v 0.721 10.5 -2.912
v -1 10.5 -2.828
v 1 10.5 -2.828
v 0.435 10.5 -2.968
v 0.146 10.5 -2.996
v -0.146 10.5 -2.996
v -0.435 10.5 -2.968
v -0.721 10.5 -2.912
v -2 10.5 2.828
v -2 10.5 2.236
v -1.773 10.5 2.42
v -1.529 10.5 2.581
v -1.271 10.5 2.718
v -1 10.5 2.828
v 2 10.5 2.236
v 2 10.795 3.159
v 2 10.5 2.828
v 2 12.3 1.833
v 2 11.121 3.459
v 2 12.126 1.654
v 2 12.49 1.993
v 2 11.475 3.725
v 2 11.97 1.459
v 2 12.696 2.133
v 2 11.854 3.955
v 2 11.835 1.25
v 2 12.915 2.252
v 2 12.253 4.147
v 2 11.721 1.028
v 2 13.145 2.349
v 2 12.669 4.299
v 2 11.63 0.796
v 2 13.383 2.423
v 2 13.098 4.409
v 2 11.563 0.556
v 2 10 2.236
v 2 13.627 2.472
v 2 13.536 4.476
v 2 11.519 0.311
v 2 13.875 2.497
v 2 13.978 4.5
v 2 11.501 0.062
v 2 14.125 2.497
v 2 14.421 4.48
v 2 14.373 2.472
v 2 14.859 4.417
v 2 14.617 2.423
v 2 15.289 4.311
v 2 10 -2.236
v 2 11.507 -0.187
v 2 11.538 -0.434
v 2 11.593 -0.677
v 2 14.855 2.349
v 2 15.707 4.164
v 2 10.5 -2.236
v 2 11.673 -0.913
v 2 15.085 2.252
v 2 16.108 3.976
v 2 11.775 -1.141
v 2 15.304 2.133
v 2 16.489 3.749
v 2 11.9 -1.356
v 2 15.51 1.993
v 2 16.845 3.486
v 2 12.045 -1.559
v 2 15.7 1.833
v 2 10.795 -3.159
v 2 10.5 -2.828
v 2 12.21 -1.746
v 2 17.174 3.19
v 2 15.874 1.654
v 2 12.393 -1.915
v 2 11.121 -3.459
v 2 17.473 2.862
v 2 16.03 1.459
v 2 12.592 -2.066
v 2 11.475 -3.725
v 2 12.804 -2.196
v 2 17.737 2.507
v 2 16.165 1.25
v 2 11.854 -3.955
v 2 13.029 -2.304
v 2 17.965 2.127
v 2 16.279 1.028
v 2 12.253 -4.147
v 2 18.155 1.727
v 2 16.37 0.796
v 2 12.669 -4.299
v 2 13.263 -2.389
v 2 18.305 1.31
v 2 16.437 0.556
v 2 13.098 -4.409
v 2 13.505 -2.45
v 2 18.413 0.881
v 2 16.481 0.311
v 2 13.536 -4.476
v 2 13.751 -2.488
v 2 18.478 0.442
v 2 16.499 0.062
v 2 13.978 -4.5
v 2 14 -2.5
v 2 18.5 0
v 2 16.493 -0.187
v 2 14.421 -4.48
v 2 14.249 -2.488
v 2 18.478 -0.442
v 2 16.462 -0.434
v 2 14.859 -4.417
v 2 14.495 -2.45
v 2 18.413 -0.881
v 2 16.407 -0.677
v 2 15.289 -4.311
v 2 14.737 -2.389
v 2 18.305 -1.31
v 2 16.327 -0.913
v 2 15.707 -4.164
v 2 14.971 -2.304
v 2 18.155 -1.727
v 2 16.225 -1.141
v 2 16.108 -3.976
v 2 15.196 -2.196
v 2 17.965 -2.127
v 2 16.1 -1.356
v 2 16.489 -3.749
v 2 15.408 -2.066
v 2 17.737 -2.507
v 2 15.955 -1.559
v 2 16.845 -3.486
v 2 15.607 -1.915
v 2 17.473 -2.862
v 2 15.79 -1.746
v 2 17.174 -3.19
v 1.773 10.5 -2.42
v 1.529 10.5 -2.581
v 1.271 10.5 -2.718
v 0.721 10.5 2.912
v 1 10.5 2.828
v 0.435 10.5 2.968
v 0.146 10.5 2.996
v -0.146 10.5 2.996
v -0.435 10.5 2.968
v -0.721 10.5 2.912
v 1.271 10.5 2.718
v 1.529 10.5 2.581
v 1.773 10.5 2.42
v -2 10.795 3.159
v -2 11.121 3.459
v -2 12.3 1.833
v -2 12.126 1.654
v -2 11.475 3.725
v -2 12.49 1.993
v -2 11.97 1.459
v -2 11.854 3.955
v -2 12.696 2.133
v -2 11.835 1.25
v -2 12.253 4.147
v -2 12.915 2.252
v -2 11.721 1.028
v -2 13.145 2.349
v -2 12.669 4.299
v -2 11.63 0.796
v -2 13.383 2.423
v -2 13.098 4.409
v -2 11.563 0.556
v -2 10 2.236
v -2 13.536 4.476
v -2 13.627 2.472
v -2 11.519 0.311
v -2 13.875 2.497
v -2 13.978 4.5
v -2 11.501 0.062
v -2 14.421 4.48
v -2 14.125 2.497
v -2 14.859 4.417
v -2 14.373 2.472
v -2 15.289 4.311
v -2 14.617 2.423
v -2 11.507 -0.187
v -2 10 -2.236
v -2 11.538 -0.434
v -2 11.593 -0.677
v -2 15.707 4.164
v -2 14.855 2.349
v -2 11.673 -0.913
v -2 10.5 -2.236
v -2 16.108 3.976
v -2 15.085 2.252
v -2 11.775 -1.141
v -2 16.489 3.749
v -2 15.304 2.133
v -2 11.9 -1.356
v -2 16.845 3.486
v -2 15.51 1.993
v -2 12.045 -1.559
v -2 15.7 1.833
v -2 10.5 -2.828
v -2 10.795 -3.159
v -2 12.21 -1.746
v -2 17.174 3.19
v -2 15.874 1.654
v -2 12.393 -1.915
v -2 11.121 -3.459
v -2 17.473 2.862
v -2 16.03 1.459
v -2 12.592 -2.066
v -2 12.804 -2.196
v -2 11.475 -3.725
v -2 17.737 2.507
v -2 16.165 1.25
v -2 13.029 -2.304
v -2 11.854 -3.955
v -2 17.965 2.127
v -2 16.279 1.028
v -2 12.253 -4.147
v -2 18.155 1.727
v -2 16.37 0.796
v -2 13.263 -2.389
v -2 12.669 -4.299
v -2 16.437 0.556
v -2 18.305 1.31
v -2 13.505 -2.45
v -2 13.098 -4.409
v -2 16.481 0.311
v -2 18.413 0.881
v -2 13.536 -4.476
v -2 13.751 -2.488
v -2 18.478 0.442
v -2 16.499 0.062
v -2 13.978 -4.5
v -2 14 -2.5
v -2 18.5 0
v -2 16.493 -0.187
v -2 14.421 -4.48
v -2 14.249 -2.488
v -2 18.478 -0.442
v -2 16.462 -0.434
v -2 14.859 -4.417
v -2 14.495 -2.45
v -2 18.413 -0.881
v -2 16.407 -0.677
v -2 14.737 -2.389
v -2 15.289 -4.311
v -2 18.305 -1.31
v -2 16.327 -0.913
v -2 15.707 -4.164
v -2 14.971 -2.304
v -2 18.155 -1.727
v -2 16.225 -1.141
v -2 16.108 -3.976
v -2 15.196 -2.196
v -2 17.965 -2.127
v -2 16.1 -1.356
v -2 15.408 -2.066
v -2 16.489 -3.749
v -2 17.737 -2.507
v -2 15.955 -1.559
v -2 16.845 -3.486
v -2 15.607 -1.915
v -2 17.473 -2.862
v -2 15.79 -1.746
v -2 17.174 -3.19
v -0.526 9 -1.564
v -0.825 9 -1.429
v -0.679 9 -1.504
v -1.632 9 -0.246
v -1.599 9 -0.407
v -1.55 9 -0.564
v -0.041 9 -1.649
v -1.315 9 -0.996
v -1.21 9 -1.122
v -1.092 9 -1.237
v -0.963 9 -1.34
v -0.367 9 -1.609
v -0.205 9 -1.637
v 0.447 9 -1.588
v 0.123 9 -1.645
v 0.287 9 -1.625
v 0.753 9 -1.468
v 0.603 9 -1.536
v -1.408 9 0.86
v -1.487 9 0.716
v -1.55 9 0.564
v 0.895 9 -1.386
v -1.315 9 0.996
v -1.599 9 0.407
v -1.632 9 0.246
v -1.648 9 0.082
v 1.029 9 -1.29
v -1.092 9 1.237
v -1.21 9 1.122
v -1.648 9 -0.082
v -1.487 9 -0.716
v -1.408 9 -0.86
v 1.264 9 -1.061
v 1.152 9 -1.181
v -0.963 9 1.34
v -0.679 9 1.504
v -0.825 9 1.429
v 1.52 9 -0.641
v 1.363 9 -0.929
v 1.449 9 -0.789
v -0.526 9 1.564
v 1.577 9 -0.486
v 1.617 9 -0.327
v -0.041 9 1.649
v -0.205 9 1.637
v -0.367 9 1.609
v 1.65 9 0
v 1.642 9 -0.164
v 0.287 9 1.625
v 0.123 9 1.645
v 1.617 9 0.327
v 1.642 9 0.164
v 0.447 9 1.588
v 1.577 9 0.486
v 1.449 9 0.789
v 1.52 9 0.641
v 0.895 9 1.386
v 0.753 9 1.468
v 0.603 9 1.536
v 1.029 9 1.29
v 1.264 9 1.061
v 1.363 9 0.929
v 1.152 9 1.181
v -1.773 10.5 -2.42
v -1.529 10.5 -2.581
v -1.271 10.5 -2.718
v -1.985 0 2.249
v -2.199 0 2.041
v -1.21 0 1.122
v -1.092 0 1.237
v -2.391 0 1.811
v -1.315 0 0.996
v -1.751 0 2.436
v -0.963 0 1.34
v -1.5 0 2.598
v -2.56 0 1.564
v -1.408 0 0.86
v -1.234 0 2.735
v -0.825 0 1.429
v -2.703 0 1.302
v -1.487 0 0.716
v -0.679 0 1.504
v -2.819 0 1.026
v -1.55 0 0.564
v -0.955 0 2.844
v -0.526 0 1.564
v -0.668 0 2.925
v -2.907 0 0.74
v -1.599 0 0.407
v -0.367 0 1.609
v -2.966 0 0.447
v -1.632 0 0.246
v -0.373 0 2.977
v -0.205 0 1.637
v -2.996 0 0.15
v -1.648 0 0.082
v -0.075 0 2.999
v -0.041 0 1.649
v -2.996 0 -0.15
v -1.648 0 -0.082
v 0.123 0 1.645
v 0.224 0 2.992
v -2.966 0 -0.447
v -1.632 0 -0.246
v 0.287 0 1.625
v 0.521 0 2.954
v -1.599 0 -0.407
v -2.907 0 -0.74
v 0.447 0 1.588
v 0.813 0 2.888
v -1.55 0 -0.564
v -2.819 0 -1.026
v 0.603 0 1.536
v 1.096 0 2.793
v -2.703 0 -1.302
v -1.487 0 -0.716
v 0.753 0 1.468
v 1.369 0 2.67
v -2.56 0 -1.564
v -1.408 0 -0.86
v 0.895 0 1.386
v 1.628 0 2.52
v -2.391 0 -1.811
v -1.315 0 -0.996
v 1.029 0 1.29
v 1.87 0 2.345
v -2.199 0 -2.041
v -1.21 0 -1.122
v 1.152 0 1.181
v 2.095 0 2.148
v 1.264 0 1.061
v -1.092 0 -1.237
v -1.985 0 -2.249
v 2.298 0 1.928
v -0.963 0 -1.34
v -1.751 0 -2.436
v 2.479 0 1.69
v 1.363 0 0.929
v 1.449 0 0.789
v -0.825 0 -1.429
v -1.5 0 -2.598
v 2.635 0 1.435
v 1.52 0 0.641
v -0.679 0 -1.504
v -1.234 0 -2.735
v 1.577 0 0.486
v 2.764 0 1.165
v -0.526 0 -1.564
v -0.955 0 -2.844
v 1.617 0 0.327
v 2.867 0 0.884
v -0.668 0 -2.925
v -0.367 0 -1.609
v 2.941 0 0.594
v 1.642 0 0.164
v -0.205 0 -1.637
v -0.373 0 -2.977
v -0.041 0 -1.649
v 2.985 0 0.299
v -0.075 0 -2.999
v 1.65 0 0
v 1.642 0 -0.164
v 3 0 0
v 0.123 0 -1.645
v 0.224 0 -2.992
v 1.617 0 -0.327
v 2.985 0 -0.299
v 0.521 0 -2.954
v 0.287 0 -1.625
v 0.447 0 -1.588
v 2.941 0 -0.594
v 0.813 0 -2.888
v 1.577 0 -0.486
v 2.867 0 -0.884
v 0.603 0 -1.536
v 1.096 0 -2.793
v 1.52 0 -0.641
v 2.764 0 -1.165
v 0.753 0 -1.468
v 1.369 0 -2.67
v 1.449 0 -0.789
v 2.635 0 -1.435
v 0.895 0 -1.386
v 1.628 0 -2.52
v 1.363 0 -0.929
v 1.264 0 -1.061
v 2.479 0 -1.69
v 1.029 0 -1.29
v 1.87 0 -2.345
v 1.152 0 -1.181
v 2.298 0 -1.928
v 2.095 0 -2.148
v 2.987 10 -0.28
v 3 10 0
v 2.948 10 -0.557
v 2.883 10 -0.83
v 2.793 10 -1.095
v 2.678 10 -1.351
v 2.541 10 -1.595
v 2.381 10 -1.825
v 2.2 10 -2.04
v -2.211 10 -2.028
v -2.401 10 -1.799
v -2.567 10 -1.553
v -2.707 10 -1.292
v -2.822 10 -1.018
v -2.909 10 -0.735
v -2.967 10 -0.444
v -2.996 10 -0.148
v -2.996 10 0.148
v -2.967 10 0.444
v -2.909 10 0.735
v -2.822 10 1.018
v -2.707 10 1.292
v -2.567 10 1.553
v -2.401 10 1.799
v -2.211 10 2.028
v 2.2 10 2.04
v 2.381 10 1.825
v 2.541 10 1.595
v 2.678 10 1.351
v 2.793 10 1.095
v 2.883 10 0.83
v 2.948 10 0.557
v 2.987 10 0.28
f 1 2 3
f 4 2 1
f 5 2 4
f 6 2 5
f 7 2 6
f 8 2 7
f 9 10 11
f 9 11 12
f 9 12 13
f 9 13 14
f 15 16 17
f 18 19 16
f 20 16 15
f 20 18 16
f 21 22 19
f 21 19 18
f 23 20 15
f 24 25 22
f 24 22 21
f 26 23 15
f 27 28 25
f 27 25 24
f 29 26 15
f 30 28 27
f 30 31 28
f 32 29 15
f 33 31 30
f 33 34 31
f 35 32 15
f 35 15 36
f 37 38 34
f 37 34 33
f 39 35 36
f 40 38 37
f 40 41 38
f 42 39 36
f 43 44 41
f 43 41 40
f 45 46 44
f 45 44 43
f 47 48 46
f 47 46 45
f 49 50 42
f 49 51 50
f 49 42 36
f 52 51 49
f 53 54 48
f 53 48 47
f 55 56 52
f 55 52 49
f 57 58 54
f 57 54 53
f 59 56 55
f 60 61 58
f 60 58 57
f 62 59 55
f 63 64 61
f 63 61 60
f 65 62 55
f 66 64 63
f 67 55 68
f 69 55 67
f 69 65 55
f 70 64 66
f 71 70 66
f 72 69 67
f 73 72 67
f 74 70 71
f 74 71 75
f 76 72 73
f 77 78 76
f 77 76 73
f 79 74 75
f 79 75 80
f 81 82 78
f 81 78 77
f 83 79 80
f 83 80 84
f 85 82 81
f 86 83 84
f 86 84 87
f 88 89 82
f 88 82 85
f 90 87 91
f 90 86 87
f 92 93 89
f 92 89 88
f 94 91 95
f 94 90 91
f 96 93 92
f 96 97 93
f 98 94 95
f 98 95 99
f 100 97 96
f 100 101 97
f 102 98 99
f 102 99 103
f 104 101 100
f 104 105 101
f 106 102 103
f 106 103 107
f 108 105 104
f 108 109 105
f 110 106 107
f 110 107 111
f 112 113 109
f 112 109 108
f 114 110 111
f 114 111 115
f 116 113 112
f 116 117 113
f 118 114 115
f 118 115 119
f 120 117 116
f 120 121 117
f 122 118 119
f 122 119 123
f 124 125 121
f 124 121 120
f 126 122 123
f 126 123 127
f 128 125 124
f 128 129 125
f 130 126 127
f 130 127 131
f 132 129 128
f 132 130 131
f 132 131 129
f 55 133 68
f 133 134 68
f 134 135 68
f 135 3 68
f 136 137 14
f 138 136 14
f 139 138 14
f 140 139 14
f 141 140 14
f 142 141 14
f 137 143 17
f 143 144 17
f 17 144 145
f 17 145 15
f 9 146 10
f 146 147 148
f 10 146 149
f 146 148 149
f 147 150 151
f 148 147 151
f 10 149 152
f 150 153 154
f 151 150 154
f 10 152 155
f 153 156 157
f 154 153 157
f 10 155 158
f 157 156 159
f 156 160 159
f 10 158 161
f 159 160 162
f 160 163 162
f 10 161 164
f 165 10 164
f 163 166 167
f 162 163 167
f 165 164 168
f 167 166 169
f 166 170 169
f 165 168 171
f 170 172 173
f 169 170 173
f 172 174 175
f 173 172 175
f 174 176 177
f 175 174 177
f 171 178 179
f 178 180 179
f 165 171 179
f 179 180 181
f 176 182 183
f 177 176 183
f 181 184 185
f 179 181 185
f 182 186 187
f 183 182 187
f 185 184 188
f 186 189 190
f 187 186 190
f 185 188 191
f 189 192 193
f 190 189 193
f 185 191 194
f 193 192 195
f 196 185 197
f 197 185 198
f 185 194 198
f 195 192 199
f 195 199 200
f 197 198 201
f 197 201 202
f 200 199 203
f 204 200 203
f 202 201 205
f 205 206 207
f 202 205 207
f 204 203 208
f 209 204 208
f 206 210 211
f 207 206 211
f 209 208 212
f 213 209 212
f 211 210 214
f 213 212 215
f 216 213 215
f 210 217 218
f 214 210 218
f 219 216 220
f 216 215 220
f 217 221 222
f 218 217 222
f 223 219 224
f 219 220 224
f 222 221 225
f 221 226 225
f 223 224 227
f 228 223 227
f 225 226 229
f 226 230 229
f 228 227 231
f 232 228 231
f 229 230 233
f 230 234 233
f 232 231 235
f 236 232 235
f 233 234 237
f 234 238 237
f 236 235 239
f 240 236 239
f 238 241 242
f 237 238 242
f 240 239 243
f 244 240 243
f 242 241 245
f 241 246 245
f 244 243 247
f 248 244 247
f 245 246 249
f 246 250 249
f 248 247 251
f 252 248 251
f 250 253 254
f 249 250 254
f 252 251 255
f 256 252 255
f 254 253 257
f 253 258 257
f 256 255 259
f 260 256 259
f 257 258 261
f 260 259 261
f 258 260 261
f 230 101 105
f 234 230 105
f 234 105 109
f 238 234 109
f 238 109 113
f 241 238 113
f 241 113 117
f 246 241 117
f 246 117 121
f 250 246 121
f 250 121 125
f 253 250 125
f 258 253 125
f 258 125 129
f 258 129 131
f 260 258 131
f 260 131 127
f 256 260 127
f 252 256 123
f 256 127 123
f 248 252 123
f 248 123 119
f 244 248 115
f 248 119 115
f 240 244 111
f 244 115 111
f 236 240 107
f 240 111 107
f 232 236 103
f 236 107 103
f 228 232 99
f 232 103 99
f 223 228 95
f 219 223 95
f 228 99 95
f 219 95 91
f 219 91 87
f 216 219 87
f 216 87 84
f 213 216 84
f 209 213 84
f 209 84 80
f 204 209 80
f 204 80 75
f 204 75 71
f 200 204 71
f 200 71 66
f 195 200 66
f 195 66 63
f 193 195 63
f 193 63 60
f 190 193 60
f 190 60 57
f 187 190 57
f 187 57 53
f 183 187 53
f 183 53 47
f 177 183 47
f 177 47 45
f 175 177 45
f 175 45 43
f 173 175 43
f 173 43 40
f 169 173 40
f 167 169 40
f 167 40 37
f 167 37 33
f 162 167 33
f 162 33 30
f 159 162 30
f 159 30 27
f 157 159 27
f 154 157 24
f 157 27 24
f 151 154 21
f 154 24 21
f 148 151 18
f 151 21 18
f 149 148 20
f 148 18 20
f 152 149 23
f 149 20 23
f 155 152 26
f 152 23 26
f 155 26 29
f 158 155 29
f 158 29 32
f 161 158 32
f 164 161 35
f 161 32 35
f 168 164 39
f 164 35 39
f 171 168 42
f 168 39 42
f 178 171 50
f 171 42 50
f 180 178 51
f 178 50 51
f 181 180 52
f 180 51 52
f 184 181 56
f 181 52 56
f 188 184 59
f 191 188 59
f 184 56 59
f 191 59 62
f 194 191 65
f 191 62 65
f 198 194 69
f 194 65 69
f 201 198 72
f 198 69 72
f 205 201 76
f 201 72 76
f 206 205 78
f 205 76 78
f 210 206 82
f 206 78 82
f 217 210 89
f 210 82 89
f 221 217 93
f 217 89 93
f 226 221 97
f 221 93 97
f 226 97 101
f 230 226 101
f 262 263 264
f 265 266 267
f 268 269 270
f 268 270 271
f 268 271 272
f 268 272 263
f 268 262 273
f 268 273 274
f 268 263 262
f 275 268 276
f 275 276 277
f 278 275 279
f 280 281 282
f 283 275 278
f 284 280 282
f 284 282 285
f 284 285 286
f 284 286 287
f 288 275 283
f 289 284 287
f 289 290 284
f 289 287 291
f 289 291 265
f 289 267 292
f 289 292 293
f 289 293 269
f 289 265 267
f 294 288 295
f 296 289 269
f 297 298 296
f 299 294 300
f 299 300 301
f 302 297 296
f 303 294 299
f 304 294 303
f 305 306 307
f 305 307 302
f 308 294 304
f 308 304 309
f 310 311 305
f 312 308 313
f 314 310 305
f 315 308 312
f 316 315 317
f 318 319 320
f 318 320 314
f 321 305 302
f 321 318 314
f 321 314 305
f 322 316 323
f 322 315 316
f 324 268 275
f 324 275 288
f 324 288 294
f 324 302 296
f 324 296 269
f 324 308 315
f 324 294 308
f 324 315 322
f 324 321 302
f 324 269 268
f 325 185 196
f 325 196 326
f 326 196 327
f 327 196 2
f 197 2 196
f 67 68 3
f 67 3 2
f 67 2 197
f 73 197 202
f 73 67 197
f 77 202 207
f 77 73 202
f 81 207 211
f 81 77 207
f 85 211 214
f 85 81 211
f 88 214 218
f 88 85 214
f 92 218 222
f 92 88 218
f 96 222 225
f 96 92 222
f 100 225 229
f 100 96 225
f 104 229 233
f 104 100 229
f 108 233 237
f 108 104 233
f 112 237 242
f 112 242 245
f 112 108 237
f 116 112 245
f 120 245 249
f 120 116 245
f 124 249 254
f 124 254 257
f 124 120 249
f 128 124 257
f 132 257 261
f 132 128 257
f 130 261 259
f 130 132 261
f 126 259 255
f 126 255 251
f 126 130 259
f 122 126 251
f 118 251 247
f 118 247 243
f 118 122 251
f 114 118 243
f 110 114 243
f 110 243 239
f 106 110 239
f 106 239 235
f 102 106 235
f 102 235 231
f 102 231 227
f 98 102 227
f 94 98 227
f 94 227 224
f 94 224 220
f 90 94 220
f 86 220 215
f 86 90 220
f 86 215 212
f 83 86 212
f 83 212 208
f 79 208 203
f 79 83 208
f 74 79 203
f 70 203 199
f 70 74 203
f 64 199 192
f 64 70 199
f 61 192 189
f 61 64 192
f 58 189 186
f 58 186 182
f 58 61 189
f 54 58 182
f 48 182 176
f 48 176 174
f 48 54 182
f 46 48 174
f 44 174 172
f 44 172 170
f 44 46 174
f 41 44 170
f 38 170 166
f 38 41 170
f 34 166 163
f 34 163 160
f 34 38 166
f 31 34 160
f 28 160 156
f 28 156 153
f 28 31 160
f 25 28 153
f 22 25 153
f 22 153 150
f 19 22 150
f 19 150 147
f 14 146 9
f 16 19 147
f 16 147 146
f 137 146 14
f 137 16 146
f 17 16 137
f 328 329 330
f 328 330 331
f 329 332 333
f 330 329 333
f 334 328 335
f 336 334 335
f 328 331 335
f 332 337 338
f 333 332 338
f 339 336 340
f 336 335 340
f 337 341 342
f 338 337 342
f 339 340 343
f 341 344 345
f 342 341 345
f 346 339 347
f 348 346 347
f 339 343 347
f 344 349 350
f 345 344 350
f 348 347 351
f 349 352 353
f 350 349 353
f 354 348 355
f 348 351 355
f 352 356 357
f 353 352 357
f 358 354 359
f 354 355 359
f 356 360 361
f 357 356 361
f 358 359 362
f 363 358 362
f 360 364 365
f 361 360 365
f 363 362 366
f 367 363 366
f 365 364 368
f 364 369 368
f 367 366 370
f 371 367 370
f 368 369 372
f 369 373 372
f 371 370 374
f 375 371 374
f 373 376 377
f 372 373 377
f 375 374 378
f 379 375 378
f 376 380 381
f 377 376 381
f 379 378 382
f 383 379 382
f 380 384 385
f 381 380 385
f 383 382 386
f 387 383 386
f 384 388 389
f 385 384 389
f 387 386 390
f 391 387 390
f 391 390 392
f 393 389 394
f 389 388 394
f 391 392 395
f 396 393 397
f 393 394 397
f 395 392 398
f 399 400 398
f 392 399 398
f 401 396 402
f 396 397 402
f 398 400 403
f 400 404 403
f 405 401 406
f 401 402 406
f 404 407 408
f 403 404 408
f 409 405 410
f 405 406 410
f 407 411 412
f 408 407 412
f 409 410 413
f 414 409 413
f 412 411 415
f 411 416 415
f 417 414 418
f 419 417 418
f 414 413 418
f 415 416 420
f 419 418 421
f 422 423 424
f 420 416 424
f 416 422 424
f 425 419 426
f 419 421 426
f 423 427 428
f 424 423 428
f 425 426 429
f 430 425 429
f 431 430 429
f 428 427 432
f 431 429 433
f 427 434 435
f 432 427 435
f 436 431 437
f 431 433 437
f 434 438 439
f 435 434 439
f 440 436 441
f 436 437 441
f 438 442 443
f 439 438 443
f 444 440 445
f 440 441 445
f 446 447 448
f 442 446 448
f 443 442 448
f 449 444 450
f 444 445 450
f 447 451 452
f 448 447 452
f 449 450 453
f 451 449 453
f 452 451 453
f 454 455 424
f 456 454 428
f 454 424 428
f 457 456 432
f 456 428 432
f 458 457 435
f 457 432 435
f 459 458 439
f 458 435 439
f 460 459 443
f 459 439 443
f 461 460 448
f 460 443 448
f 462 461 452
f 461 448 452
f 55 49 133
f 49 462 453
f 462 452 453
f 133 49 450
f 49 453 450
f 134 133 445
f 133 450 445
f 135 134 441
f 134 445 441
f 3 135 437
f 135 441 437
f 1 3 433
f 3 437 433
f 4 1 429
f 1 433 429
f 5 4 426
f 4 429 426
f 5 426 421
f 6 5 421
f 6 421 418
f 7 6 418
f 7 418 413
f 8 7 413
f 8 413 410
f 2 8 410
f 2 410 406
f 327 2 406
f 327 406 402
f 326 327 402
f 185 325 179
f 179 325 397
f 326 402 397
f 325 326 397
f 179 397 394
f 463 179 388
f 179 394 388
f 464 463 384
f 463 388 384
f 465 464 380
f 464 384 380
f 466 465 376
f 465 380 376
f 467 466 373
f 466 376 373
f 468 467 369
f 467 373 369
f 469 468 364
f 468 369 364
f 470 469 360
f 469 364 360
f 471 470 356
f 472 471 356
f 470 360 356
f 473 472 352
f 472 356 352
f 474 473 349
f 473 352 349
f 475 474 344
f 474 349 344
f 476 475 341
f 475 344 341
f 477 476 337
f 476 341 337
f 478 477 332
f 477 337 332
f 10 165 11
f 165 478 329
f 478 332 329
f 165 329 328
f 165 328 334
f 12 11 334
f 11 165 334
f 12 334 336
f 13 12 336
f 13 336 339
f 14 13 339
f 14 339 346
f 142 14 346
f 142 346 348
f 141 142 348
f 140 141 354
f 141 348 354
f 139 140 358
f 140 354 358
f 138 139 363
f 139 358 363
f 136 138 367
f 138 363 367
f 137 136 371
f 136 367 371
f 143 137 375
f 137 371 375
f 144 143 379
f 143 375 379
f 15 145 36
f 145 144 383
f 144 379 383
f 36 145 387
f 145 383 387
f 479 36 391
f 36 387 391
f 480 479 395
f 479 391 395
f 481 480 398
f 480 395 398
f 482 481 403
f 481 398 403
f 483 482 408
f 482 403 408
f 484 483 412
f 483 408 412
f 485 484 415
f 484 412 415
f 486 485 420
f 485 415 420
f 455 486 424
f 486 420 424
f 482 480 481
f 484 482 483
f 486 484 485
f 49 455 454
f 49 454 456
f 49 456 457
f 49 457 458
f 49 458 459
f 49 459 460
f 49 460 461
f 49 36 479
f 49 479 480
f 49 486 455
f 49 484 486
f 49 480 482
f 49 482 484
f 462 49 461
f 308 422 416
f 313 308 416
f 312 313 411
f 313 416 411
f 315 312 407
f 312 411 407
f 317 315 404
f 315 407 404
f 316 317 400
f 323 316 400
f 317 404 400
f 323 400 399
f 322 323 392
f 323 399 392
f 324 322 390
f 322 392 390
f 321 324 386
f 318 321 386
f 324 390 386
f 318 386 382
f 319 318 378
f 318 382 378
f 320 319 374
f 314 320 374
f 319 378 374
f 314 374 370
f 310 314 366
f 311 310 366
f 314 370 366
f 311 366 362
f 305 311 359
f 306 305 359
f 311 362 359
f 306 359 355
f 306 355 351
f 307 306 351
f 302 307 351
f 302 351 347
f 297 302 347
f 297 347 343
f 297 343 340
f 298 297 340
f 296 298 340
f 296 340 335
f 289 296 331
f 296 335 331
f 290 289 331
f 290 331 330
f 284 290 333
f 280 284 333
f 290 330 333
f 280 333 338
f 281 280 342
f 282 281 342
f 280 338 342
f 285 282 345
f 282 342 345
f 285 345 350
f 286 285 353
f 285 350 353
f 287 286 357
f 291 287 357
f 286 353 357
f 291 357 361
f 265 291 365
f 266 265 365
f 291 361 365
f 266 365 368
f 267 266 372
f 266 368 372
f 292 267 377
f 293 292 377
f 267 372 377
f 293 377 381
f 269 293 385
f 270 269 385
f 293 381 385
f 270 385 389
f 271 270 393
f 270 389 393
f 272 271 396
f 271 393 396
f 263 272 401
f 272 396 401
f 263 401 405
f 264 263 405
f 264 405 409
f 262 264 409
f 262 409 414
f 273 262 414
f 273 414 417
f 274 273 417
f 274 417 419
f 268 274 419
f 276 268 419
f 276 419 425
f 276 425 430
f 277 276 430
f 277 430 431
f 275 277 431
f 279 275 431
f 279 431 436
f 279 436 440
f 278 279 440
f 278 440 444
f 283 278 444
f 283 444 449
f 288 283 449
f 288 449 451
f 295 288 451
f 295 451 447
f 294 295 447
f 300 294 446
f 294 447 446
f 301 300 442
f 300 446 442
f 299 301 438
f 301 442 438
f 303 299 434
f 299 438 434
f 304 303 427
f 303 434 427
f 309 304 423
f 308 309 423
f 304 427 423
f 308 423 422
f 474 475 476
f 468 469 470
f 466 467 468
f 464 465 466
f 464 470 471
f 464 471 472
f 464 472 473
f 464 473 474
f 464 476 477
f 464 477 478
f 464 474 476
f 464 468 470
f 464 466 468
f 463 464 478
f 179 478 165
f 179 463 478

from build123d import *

# Parameters (mm, degrees)
SKETCH1_R                 = 3
CRANK_BODY_DEPTH          = 10
SKETCH2_R                 = 1.65
DOWEL_SHAFT_DEPTH         = 9
PIN_SHAFT_BODY_DEPTH      = 2
PIN_SHAFT_BODY_DEPTH_BACK = 2
SKETCH4_R                 = 2.5
PIN_SHAFT_DEPTH           = 20.685019685
SKETCH1_2_OUTSIDE_W       = 12.286
SKETCH1_2_OUTSIDE_H       = 15.286
SKETCH1_2_OUTSIDE_R       = 3
SMOOTHING_CUTS_DEPTH      = 10.5


with BuildPart() as part:
    # Sketch1 → crank_body (new body)
    with BuildSketch(Plane(origin=(0, 0, 0), x_dir=(1, 0, 0), z_dir=(0, 1, 0))):
        Circle(SKETCH1_R)
    extrude(amount=CRANK_BODY_DEPTH)

    # Sketch2 → dowel_shaft (cut)
    with BuildSketch(Plane.XZ):
        Circle(SKETCH2_R)
    extrude(amount=-DOWEL_SHAFT_DEPTH, mode=Mode.SUBTRACT)

    # Sketch3 → pin_shaft_body (add, two sides: drawn at the far end of the back side and taken through both)
    with BuildSketch(Plane(origin=(0, 0, 0), x_dir=(0, 0, -1), z_dir=(1, 0, 0)).offset(-PIN_SHAFT_BODY_DEPTH_BACK)):
        with BuildLine():
            Line((-3, 10.5), (-3, 10))
            Line((-3, 10), (3, 10))
            Line((3, 10), (3, 10.5))
            Line((3, 10.5), (2.828427125, 10.5))
            ThreePointArc((2.828427125, 10.5), (0, 18.5), (-2.828427125, 10.5))
            Line((-2.828427125, 10.5), (-3, 10.5))
        make_face()
    extrude(amount=PIN_SHAFT_BODY_DEPTH + PIN_SHAFT_BODY_DEPTH_BACK)

    # Sketch4 → pin_shaft (cut, through all)
    with BuildSketch(Plane(origin=(2, 0, 0), x_dir=(0, 0, -1), z_dir=(1, 0, 0))):
        with Locations((0, 14)):
            Circle(SKETCH4_R)
    extrude(amount=-PIN_SHAFT_DEPTH, mode=Mode.SUBTRACT)

    # Sketch1<2> outside → smoothing_cuts (cut)
    with BuildSketch(Plane(origin=(0, 0, 0), x_dir=(1, 0, 0), z_dir=(0, 1, 0))):
        Rectangle(SKETCH1_2_OUTSIDE_W, SKETCH1_2_OUTSIDE_H)
        Circle(SKETCH1_2_OUTSIDE_R, mode=Mode.SUBTRACT)
    extrude(amount=SMOOTHING_CUTS_DEPTH, mode=Mode.SUBTRACT)


solid = part.part
